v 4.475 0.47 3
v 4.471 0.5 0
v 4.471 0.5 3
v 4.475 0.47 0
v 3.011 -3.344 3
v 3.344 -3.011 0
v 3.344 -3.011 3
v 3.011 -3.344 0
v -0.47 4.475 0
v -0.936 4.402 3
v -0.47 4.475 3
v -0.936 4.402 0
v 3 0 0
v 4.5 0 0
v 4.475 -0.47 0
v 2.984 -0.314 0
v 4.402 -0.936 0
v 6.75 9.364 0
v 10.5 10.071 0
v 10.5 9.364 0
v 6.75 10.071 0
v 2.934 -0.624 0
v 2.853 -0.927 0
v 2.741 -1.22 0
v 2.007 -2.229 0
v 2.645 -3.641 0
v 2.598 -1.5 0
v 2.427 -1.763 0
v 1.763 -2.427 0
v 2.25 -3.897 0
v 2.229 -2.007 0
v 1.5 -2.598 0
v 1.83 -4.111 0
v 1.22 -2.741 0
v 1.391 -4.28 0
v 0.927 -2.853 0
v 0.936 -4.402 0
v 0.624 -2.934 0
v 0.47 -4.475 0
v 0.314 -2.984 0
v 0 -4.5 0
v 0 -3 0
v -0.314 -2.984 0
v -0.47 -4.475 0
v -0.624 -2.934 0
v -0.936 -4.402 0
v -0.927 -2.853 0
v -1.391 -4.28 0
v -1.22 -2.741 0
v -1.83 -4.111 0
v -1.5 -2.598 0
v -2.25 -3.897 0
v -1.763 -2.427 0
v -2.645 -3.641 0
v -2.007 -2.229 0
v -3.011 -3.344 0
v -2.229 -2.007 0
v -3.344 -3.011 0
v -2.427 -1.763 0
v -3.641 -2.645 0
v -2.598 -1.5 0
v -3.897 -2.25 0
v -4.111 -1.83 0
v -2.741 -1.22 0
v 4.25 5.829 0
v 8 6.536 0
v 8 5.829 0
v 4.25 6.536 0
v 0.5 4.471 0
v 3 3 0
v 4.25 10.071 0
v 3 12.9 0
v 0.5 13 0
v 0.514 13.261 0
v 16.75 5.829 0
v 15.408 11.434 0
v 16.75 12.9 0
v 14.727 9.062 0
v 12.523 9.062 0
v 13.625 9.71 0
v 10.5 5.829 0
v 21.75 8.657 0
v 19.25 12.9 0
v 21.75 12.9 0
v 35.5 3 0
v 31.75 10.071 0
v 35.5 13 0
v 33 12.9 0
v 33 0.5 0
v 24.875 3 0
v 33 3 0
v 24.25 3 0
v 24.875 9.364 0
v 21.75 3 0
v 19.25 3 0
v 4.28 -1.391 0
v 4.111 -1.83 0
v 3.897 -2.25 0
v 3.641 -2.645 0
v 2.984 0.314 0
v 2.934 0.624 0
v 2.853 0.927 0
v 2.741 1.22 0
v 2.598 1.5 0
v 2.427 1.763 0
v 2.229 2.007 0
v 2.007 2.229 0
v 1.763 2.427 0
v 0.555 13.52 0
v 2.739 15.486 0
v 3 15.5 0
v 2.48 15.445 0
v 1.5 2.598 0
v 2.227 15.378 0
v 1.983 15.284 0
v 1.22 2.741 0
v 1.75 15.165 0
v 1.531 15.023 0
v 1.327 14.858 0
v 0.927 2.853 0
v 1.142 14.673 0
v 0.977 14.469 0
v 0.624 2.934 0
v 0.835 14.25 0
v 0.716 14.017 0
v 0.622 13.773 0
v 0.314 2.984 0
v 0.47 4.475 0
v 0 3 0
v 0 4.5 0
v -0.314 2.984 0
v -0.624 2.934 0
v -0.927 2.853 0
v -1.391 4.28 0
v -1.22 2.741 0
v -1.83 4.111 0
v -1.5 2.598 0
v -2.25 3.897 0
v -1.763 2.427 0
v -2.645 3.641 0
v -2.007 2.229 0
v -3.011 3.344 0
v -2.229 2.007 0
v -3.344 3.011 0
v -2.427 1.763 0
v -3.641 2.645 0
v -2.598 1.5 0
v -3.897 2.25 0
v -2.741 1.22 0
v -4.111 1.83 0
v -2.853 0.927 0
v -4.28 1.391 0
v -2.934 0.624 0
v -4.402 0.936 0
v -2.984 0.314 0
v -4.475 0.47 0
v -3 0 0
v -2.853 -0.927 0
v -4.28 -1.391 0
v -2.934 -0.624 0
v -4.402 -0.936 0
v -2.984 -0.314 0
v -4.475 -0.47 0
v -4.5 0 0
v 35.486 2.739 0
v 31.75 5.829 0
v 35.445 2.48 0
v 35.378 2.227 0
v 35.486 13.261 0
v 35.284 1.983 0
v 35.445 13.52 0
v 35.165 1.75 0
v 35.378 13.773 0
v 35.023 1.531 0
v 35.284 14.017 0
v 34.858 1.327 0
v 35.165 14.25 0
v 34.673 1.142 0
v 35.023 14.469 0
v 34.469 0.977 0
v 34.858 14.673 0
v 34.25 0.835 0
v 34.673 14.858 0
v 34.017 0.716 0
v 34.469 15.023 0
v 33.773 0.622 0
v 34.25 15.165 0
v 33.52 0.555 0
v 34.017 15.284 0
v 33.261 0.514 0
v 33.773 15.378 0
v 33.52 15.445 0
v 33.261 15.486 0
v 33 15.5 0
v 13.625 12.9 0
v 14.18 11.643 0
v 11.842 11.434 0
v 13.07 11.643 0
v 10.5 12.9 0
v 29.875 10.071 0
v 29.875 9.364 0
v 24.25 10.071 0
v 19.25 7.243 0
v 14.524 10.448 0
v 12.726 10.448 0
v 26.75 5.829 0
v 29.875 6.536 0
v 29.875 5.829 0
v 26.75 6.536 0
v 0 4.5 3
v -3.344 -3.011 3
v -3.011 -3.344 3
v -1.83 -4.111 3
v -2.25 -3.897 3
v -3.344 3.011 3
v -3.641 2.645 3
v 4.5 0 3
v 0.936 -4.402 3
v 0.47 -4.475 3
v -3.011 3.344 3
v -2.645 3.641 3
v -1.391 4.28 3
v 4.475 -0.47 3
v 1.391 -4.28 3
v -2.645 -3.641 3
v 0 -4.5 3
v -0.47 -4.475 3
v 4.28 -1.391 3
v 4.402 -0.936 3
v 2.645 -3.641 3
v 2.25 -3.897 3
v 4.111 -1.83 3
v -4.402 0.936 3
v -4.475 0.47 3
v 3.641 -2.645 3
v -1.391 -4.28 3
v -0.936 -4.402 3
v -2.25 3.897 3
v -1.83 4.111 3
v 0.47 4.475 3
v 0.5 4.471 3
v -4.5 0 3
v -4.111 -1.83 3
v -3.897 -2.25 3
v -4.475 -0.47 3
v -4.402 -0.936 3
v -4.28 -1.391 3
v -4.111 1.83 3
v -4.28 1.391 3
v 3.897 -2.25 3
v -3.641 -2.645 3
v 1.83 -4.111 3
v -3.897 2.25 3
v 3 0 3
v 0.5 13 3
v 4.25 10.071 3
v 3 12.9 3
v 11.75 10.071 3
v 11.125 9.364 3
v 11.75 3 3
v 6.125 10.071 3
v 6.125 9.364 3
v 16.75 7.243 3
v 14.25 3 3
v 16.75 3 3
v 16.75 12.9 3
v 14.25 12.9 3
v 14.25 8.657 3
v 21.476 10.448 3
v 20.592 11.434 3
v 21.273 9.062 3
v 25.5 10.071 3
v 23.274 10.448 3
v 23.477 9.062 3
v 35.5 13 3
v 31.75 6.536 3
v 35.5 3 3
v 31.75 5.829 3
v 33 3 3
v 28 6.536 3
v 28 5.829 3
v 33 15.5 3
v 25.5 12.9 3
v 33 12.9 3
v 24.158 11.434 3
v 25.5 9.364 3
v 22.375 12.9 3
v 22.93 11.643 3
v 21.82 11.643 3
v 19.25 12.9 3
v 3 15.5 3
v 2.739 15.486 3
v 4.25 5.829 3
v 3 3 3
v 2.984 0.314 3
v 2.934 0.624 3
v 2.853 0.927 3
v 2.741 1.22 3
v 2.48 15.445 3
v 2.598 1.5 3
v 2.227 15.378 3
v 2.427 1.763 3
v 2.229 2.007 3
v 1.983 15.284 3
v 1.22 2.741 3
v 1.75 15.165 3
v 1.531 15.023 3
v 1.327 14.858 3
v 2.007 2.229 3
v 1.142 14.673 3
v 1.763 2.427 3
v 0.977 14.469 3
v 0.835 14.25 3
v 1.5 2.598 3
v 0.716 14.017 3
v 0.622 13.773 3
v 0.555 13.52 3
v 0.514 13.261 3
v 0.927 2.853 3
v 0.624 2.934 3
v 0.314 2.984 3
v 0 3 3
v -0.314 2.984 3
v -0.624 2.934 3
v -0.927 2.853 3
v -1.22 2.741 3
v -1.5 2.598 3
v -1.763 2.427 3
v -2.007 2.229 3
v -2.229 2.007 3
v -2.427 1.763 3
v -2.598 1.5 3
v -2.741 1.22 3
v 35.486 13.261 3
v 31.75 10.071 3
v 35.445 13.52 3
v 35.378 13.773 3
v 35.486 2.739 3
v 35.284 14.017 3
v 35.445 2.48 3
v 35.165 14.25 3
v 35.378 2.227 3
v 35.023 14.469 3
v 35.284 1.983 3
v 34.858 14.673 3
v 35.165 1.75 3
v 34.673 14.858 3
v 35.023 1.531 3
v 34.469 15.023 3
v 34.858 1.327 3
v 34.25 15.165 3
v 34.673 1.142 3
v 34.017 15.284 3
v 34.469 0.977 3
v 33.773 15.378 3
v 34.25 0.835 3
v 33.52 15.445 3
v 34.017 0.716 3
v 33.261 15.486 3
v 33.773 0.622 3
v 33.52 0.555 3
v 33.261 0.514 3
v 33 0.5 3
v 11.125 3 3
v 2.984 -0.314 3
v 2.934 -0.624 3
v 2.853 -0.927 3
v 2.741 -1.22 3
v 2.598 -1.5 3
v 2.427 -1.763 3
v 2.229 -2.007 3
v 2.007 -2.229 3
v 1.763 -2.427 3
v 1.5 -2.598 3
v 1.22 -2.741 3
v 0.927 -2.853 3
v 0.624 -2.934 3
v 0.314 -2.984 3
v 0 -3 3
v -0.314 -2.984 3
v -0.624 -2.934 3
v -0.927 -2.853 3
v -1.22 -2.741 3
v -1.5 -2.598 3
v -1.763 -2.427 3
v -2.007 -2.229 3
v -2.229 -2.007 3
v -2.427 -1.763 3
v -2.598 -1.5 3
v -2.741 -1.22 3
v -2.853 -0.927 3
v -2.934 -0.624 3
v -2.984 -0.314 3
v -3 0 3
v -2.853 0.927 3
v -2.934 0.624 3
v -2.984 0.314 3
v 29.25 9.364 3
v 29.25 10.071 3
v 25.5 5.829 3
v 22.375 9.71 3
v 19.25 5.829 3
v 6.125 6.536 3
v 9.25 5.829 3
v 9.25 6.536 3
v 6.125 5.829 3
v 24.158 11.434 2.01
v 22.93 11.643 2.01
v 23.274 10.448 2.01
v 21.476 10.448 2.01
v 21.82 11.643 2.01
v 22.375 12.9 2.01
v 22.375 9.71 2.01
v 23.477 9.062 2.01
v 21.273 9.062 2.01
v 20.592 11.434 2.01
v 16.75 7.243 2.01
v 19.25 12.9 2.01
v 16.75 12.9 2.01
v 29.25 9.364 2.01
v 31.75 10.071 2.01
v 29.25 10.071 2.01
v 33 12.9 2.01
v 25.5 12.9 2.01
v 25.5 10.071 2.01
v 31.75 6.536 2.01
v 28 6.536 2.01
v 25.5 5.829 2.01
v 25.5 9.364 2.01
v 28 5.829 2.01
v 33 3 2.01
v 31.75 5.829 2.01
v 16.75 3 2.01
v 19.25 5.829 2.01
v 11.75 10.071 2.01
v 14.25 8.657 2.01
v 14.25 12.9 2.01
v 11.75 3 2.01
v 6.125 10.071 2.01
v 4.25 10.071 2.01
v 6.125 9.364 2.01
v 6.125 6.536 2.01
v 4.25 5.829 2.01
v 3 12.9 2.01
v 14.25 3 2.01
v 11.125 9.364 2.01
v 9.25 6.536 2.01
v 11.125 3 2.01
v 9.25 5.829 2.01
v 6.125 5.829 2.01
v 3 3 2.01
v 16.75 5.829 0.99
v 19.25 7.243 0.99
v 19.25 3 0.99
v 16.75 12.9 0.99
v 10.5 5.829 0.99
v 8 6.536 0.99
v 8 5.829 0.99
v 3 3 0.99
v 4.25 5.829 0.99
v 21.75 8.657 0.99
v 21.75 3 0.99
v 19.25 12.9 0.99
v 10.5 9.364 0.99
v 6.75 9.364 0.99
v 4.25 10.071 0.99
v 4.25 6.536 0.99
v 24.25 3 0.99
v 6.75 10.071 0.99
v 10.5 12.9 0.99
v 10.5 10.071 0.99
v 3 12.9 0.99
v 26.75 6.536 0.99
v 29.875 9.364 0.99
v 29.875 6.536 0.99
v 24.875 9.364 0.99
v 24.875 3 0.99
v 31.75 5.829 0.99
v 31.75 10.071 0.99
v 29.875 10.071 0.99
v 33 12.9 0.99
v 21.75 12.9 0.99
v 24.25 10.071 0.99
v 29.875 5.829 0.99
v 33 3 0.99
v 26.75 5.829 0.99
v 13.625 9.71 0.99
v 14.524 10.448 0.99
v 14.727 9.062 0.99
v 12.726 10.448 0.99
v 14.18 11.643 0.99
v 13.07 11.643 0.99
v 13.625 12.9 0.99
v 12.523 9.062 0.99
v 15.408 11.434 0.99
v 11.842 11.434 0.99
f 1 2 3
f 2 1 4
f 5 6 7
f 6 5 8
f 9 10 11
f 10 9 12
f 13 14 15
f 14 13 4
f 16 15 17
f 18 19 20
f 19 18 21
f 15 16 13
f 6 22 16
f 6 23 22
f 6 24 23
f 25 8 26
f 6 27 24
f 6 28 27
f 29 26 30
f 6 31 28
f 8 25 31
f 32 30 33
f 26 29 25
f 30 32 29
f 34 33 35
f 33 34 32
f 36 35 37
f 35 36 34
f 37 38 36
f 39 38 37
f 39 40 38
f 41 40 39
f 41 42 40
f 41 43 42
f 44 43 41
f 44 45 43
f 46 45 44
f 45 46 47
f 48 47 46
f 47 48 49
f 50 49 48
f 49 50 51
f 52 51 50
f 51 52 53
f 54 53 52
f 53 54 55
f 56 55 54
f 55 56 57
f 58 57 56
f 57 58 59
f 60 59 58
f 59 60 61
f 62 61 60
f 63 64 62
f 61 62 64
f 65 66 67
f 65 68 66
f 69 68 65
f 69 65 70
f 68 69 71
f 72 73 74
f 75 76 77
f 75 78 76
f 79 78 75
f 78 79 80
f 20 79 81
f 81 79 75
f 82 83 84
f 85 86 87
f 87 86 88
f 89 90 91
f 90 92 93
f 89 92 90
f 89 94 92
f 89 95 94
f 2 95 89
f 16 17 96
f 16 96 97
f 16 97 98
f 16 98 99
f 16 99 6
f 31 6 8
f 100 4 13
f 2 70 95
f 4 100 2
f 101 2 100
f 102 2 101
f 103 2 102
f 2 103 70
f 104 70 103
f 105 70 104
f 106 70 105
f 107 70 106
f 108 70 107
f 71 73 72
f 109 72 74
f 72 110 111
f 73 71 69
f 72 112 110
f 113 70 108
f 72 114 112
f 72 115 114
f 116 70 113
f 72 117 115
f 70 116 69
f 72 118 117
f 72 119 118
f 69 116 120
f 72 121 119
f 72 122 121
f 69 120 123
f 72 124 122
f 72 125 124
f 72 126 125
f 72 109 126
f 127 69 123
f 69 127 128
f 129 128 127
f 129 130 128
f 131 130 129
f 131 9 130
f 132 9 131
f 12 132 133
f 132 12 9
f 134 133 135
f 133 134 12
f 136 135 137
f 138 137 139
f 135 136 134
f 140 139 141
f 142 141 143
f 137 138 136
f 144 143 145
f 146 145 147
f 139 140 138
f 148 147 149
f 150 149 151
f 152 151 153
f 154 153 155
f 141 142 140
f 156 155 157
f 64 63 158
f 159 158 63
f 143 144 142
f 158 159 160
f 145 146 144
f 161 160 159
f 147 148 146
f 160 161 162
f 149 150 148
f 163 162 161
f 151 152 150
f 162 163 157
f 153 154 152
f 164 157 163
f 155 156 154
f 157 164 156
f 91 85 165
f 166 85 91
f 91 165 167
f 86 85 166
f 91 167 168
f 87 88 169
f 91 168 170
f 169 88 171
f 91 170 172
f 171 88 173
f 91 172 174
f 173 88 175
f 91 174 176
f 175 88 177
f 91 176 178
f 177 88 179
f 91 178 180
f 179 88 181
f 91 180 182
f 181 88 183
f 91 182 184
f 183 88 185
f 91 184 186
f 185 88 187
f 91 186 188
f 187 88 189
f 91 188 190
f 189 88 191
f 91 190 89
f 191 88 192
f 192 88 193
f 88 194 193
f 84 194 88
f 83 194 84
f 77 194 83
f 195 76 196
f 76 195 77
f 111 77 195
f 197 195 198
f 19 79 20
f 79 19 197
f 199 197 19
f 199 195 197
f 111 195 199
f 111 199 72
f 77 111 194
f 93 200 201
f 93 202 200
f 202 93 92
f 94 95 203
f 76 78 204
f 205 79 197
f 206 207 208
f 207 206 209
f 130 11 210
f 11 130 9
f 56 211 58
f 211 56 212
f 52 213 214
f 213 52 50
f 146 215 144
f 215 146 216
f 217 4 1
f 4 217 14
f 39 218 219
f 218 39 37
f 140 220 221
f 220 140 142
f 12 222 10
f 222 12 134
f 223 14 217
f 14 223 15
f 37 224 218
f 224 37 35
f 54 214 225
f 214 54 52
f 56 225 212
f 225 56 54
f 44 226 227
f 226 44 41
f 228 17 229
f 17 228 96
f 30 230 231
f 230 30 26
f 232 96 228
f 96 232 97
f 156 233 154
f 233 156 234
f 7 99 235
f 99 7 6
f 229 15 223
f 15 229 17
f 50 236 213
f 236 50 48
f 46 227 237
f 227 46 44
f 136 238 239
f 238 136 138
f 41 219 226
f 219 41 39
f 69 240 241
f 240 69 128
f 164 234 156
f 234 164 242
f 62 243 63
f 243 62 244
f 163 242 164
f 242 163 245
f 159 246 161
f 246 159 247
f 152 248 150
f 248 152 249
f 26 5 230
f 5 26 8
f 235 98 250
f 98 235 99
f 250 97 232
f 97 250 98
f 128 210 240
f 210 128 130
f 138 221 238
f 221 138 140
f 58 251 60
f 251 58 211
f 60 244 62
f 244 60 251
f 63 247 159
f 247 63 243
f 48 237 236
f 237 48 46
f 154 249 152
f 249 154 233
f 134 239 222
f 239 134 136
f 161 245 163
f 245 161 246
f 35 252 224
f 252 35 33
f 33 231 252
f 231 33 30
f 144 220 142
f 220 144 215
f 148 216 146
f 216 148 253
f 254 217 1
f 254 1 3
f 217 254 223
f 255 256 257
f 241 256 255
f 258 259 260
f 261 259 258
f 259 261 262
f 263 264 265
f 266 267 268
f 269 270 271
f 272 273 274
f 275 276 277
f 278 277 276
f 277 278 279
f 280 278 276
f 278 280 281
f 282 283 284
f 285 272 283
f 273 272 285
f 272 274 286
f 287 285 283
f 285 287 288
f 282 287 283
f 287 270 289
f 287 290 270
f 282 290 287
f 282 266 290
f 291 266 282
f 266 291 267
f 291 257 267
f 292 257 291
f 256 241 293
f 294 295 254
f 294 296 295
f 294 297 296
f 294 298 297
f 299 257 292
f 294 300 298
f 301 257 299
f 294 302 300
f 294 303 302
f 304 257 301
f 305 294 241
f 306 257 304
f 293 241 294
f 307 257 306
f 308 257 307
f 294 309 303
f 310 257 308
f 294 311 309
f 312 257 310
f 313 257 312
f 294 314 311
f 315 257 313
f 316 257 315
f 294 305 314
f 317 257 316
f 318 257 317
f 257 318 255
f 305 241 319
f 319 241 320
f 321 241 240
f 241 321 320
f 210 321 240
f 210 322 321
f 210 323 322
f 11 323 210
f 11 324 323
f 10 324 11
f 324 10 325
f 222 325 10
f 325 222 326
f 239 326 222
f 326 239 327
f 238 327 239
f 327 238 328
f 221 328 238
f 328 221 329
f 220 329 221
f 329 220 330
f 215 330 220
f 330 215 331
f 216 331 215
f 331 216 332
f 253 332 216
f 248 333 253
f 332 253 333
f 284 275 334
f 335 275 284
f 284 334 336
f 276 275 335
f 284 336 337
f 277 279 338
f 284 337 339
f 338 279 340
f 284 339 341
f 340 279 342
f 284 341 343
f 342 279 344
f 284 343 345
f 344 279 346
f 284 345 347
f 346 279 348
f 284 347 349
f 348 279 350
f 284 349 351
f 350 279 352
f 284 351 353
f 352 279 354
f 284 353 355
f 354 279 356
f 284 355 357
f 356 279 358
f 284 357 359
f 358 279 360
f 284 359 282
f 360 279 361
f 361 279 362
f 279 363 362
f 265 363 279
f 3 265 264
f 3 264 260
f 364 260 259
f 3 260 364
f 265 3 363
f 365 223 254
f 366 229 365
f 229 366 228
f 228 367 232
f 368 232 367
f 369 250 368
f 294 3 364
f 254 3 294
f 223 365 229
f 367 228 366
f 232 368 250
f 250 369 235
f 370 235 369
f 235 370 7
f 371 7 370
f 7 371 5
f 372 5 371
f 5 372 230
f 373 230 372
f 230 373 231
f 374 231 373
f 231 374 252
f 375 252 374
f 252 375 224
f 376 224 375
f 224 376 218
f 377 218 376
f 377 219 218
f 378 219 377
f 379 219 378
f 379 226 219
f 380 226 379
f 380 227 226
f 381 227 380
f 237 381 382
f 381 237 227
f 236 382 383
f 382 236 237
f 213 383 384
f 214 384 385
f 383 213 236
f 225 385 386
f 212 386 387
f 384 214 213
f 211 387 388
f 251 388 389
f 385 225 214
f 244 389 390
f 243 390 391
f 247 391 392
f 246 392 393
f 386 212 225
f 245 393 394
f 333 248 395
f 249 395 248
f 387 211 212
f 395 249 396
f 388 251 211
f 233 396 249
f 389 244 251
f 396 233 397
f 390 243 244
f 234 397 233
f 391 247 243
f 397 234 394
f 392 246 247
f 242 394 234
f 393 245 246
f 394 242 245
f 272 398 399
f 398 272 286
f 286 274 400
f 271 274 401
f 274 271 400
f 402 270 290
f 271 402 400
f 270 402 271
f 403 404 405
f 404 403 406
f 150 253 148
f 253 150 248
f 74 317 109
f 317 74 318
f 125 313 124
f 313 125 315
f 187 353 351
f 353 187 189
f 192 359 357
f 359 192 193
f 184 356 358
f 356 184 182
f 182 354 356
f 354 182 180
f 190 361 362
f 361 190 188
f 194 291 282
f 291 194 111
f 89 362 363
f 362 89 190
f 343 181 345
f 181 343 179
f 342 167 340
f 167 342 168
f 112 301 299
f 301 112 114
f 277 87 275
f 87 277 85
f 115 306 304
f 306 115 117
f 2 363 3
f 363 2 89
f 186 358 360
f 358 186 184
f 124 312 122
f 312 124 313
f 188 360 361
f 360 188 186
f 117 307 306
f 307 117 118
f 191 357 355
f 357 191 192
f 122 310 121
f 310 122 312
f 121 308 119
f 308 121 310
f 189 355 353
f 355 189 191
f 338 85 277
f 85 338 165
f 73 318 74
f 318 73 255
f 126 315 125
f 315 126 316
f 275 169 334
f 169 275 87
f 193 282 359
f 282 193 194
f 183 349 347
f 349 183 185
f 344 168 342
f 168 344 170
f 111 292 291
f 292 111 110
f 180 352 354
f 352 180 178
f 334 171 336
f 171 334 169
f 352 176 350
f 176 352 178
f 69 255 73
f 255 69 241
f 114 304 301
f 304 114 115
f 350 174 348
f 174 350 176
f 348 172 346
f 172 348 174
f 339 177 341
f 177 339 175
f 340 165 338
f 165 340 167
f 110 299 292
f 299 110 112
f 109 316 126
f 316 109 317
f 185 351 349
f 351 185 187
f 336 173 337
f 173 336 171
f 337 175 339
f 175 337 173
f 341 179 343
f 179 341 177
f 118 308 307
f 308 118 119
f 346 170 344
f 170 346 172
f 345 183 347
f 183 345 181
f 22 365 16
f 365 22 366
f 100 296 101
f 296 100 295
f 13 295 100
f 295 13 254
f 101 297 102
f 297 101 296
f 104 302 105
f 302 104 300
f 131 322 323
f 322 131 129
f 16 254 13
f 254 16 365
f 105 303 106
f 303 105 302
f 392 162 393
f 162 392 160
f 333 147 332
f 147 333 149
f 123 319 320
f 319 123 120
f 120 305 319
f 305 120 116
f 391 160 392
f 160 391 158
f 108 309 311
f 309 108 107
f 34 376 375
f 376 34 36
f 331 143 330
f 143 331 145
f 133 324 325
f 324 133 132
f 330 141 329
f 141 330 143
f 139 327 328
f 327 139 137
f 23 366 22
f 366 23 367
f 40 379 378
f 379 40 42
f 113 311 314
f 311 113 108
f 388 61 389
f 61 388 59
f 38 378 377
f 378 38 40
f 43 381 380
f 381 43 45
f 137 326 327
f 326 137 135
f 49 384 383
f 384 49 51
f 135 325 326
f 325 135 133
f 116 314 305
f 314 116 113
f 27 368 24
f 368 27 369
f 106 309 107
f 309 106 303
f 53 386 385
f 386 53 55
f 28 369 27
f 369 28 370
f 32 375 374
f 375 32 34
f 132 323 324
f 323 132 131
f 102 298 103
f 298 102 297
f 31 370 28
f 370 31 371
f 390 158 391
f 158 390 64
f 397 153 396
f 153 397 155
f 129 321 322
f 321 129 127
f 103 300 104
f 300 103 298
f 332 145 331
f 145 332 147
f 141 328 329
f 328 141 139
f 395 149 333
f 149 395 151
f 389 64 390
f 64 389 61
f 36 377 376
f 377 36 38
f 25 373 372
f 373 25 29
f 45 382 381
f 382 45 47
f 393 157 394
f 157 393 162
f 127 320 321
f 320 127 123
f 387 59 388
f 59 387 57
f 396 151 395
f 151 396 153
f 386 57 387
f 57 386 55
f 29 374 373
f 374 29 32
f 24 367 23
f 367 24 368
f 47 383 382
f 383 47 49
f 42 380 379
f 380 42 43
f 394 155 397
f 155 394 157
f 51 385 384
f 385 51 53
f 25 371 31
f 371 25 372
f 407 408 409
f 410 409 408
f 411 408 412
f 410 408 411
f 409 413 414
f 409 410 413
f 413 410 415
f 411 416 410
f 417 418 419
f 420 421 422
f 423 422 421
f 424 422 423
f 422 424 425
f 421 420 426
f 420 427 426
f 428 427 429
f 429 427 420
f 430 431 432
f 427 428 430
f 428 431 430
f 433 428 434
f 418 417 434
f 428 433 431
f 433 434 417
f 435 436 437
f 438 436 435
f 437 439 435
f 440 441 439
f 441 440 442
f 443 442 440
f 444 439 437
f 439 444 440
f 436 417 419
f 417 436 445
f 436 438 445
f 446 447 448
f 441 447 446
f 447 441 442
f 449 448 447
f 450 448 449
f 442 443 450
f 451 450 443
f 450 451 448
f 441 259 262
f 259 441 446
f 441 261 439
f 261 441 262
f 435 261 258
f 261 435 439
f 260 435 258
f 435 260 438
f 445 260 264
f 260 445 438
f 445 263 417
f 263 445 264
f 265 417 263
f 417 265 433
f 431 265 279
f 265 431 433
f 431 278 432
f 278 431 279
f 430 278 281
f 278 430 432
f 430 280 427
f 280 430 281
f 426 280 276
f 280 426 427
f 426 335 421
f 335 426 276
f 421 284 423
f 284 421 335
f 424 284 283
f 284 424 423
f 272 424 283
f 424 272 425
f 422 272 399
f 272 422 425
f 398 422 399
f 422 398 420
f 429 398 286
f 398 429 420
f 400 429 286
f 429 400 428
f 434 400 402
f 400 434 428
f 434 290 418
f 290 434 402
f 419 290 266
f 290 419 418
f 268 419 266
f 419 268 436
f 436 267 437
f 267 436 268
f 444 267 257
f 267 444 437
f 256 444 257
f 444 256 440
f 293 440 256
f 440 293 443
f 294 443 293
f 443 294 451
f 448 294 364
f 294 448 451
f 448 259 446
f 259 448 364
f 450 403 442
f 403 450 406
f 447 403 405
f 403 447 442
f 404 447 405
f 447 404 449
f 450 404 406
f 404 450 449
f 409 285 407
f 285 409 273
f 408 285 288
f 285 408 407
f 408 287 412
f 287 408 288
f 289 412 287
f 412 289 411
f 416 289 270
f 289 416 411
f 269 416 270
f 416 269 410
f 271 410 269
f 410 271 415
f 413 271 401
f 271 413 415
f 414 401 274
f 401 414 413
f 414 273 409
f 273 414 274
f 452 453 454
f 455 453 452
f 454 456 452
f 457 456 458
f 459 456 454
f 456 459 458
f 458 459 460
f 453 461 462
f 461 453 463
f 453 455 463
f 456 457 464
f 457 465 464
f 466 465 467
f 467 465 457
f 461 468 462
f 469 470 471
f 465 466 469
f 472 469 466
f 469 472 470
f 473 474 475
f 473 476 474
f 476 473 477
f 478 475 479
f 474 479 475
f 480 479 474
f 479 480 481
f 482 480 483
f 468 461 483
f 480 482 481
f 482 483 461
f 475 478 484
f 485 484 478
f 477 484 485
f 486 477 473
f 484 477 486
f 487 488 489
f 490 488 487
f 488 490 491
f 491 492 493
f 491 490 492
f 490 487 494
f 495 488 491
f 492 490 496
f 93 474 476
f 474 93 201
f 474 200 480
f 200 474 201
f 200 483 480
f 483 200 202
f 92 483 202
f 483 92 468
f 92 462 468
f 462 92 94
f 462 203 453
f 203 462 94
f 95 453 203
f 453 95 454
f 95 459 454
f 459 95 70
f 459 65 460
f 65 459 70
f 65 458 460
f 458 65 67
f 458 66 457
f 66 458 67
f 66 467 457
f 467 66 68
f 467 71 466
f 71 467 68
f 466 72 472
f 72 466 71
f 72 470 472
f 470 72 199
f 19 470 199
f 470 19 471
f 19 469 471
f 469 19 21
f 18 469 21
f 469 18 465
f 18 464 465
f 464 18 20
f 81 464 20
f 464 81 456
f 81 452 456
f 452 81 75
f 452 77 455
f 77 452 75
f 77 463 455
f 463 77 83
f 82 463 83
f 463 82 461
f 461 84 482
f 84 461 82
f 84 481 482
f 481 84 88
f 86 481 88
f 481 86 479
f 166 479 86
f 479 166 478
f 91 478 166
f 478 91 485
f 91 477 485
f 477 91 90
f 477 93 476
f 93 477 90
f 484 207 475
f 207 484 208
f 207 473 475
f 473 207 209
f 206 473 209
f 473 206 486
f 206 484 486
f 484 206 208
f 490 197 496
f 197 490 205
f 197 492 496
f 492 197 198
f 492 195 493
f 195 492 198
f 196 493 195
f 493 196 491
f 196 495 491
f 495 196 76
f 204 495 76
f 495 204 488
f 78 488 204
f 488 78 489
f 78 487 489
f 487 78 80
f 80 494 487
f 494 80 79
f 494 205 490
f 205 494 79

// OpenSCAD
drill = 6;
height = 3;
width = 30;
$fn = 60;

module logo_bi2_flat()
{
    a=[[0,0],[13,0],[13,9],[5,9],[5,10],[14,10],[14,0],[18,0],[22,6],[22,0],[48,0],[46,4],[40,4],[40,5],[46,5],[46,10],[48,14],[36,14],[36,10],[42,10],[42,9],[36,9],[36,4],[26,4],[26,14],[22,14],[18,8],[18,14],[0,14],[2,10],[2,4]];
    b=[[5,4],[10,4],[10,5],[5,5]];
    c=[[0,0],[1,1],[0,3],[-1,1]];
    difference()
    {
        polygon(a); 
        polygon(b);
    }
    translate([31,11]) for(i=[0:72:360])rotate([0,0,i]) polygon(c);
}

module keychain()
{
    difference()
    {
        union()
        {
            translate([0,0,0]) cylinder(d=(drill+3),h=height);
            translate([(drill/2),(drill/2),0])hull()
            {
                translate([0,(width/3),0]) cylinder(d=5,h=height);
                translate([width,(width/3),0]) cylinder(d=5,h=height);
                translate([0,0,0]) cylinder(d=5,h=height);
                translate([width,0,0]) cylinder(d=5,h=height);
            }
        }
        union()
        {
            translate([0,0,-0.5]) cylinder(d=drill,h=(height+1));
            translate([3,3,height*0.67]) 
                resize([(width),(width*0.33),(height/3)]) 
                    linear_extrude(height/3) 
                        logo_bi2_flat();
            translate([(width+3),3,-0.01]) 
                mirror([1,0,0]) resize([(width),(width*0.33),(height/3)]) 
                    linear_extrude(height/3) 
                        logo_bi2_flat();
        }
    }
}


keychain();
